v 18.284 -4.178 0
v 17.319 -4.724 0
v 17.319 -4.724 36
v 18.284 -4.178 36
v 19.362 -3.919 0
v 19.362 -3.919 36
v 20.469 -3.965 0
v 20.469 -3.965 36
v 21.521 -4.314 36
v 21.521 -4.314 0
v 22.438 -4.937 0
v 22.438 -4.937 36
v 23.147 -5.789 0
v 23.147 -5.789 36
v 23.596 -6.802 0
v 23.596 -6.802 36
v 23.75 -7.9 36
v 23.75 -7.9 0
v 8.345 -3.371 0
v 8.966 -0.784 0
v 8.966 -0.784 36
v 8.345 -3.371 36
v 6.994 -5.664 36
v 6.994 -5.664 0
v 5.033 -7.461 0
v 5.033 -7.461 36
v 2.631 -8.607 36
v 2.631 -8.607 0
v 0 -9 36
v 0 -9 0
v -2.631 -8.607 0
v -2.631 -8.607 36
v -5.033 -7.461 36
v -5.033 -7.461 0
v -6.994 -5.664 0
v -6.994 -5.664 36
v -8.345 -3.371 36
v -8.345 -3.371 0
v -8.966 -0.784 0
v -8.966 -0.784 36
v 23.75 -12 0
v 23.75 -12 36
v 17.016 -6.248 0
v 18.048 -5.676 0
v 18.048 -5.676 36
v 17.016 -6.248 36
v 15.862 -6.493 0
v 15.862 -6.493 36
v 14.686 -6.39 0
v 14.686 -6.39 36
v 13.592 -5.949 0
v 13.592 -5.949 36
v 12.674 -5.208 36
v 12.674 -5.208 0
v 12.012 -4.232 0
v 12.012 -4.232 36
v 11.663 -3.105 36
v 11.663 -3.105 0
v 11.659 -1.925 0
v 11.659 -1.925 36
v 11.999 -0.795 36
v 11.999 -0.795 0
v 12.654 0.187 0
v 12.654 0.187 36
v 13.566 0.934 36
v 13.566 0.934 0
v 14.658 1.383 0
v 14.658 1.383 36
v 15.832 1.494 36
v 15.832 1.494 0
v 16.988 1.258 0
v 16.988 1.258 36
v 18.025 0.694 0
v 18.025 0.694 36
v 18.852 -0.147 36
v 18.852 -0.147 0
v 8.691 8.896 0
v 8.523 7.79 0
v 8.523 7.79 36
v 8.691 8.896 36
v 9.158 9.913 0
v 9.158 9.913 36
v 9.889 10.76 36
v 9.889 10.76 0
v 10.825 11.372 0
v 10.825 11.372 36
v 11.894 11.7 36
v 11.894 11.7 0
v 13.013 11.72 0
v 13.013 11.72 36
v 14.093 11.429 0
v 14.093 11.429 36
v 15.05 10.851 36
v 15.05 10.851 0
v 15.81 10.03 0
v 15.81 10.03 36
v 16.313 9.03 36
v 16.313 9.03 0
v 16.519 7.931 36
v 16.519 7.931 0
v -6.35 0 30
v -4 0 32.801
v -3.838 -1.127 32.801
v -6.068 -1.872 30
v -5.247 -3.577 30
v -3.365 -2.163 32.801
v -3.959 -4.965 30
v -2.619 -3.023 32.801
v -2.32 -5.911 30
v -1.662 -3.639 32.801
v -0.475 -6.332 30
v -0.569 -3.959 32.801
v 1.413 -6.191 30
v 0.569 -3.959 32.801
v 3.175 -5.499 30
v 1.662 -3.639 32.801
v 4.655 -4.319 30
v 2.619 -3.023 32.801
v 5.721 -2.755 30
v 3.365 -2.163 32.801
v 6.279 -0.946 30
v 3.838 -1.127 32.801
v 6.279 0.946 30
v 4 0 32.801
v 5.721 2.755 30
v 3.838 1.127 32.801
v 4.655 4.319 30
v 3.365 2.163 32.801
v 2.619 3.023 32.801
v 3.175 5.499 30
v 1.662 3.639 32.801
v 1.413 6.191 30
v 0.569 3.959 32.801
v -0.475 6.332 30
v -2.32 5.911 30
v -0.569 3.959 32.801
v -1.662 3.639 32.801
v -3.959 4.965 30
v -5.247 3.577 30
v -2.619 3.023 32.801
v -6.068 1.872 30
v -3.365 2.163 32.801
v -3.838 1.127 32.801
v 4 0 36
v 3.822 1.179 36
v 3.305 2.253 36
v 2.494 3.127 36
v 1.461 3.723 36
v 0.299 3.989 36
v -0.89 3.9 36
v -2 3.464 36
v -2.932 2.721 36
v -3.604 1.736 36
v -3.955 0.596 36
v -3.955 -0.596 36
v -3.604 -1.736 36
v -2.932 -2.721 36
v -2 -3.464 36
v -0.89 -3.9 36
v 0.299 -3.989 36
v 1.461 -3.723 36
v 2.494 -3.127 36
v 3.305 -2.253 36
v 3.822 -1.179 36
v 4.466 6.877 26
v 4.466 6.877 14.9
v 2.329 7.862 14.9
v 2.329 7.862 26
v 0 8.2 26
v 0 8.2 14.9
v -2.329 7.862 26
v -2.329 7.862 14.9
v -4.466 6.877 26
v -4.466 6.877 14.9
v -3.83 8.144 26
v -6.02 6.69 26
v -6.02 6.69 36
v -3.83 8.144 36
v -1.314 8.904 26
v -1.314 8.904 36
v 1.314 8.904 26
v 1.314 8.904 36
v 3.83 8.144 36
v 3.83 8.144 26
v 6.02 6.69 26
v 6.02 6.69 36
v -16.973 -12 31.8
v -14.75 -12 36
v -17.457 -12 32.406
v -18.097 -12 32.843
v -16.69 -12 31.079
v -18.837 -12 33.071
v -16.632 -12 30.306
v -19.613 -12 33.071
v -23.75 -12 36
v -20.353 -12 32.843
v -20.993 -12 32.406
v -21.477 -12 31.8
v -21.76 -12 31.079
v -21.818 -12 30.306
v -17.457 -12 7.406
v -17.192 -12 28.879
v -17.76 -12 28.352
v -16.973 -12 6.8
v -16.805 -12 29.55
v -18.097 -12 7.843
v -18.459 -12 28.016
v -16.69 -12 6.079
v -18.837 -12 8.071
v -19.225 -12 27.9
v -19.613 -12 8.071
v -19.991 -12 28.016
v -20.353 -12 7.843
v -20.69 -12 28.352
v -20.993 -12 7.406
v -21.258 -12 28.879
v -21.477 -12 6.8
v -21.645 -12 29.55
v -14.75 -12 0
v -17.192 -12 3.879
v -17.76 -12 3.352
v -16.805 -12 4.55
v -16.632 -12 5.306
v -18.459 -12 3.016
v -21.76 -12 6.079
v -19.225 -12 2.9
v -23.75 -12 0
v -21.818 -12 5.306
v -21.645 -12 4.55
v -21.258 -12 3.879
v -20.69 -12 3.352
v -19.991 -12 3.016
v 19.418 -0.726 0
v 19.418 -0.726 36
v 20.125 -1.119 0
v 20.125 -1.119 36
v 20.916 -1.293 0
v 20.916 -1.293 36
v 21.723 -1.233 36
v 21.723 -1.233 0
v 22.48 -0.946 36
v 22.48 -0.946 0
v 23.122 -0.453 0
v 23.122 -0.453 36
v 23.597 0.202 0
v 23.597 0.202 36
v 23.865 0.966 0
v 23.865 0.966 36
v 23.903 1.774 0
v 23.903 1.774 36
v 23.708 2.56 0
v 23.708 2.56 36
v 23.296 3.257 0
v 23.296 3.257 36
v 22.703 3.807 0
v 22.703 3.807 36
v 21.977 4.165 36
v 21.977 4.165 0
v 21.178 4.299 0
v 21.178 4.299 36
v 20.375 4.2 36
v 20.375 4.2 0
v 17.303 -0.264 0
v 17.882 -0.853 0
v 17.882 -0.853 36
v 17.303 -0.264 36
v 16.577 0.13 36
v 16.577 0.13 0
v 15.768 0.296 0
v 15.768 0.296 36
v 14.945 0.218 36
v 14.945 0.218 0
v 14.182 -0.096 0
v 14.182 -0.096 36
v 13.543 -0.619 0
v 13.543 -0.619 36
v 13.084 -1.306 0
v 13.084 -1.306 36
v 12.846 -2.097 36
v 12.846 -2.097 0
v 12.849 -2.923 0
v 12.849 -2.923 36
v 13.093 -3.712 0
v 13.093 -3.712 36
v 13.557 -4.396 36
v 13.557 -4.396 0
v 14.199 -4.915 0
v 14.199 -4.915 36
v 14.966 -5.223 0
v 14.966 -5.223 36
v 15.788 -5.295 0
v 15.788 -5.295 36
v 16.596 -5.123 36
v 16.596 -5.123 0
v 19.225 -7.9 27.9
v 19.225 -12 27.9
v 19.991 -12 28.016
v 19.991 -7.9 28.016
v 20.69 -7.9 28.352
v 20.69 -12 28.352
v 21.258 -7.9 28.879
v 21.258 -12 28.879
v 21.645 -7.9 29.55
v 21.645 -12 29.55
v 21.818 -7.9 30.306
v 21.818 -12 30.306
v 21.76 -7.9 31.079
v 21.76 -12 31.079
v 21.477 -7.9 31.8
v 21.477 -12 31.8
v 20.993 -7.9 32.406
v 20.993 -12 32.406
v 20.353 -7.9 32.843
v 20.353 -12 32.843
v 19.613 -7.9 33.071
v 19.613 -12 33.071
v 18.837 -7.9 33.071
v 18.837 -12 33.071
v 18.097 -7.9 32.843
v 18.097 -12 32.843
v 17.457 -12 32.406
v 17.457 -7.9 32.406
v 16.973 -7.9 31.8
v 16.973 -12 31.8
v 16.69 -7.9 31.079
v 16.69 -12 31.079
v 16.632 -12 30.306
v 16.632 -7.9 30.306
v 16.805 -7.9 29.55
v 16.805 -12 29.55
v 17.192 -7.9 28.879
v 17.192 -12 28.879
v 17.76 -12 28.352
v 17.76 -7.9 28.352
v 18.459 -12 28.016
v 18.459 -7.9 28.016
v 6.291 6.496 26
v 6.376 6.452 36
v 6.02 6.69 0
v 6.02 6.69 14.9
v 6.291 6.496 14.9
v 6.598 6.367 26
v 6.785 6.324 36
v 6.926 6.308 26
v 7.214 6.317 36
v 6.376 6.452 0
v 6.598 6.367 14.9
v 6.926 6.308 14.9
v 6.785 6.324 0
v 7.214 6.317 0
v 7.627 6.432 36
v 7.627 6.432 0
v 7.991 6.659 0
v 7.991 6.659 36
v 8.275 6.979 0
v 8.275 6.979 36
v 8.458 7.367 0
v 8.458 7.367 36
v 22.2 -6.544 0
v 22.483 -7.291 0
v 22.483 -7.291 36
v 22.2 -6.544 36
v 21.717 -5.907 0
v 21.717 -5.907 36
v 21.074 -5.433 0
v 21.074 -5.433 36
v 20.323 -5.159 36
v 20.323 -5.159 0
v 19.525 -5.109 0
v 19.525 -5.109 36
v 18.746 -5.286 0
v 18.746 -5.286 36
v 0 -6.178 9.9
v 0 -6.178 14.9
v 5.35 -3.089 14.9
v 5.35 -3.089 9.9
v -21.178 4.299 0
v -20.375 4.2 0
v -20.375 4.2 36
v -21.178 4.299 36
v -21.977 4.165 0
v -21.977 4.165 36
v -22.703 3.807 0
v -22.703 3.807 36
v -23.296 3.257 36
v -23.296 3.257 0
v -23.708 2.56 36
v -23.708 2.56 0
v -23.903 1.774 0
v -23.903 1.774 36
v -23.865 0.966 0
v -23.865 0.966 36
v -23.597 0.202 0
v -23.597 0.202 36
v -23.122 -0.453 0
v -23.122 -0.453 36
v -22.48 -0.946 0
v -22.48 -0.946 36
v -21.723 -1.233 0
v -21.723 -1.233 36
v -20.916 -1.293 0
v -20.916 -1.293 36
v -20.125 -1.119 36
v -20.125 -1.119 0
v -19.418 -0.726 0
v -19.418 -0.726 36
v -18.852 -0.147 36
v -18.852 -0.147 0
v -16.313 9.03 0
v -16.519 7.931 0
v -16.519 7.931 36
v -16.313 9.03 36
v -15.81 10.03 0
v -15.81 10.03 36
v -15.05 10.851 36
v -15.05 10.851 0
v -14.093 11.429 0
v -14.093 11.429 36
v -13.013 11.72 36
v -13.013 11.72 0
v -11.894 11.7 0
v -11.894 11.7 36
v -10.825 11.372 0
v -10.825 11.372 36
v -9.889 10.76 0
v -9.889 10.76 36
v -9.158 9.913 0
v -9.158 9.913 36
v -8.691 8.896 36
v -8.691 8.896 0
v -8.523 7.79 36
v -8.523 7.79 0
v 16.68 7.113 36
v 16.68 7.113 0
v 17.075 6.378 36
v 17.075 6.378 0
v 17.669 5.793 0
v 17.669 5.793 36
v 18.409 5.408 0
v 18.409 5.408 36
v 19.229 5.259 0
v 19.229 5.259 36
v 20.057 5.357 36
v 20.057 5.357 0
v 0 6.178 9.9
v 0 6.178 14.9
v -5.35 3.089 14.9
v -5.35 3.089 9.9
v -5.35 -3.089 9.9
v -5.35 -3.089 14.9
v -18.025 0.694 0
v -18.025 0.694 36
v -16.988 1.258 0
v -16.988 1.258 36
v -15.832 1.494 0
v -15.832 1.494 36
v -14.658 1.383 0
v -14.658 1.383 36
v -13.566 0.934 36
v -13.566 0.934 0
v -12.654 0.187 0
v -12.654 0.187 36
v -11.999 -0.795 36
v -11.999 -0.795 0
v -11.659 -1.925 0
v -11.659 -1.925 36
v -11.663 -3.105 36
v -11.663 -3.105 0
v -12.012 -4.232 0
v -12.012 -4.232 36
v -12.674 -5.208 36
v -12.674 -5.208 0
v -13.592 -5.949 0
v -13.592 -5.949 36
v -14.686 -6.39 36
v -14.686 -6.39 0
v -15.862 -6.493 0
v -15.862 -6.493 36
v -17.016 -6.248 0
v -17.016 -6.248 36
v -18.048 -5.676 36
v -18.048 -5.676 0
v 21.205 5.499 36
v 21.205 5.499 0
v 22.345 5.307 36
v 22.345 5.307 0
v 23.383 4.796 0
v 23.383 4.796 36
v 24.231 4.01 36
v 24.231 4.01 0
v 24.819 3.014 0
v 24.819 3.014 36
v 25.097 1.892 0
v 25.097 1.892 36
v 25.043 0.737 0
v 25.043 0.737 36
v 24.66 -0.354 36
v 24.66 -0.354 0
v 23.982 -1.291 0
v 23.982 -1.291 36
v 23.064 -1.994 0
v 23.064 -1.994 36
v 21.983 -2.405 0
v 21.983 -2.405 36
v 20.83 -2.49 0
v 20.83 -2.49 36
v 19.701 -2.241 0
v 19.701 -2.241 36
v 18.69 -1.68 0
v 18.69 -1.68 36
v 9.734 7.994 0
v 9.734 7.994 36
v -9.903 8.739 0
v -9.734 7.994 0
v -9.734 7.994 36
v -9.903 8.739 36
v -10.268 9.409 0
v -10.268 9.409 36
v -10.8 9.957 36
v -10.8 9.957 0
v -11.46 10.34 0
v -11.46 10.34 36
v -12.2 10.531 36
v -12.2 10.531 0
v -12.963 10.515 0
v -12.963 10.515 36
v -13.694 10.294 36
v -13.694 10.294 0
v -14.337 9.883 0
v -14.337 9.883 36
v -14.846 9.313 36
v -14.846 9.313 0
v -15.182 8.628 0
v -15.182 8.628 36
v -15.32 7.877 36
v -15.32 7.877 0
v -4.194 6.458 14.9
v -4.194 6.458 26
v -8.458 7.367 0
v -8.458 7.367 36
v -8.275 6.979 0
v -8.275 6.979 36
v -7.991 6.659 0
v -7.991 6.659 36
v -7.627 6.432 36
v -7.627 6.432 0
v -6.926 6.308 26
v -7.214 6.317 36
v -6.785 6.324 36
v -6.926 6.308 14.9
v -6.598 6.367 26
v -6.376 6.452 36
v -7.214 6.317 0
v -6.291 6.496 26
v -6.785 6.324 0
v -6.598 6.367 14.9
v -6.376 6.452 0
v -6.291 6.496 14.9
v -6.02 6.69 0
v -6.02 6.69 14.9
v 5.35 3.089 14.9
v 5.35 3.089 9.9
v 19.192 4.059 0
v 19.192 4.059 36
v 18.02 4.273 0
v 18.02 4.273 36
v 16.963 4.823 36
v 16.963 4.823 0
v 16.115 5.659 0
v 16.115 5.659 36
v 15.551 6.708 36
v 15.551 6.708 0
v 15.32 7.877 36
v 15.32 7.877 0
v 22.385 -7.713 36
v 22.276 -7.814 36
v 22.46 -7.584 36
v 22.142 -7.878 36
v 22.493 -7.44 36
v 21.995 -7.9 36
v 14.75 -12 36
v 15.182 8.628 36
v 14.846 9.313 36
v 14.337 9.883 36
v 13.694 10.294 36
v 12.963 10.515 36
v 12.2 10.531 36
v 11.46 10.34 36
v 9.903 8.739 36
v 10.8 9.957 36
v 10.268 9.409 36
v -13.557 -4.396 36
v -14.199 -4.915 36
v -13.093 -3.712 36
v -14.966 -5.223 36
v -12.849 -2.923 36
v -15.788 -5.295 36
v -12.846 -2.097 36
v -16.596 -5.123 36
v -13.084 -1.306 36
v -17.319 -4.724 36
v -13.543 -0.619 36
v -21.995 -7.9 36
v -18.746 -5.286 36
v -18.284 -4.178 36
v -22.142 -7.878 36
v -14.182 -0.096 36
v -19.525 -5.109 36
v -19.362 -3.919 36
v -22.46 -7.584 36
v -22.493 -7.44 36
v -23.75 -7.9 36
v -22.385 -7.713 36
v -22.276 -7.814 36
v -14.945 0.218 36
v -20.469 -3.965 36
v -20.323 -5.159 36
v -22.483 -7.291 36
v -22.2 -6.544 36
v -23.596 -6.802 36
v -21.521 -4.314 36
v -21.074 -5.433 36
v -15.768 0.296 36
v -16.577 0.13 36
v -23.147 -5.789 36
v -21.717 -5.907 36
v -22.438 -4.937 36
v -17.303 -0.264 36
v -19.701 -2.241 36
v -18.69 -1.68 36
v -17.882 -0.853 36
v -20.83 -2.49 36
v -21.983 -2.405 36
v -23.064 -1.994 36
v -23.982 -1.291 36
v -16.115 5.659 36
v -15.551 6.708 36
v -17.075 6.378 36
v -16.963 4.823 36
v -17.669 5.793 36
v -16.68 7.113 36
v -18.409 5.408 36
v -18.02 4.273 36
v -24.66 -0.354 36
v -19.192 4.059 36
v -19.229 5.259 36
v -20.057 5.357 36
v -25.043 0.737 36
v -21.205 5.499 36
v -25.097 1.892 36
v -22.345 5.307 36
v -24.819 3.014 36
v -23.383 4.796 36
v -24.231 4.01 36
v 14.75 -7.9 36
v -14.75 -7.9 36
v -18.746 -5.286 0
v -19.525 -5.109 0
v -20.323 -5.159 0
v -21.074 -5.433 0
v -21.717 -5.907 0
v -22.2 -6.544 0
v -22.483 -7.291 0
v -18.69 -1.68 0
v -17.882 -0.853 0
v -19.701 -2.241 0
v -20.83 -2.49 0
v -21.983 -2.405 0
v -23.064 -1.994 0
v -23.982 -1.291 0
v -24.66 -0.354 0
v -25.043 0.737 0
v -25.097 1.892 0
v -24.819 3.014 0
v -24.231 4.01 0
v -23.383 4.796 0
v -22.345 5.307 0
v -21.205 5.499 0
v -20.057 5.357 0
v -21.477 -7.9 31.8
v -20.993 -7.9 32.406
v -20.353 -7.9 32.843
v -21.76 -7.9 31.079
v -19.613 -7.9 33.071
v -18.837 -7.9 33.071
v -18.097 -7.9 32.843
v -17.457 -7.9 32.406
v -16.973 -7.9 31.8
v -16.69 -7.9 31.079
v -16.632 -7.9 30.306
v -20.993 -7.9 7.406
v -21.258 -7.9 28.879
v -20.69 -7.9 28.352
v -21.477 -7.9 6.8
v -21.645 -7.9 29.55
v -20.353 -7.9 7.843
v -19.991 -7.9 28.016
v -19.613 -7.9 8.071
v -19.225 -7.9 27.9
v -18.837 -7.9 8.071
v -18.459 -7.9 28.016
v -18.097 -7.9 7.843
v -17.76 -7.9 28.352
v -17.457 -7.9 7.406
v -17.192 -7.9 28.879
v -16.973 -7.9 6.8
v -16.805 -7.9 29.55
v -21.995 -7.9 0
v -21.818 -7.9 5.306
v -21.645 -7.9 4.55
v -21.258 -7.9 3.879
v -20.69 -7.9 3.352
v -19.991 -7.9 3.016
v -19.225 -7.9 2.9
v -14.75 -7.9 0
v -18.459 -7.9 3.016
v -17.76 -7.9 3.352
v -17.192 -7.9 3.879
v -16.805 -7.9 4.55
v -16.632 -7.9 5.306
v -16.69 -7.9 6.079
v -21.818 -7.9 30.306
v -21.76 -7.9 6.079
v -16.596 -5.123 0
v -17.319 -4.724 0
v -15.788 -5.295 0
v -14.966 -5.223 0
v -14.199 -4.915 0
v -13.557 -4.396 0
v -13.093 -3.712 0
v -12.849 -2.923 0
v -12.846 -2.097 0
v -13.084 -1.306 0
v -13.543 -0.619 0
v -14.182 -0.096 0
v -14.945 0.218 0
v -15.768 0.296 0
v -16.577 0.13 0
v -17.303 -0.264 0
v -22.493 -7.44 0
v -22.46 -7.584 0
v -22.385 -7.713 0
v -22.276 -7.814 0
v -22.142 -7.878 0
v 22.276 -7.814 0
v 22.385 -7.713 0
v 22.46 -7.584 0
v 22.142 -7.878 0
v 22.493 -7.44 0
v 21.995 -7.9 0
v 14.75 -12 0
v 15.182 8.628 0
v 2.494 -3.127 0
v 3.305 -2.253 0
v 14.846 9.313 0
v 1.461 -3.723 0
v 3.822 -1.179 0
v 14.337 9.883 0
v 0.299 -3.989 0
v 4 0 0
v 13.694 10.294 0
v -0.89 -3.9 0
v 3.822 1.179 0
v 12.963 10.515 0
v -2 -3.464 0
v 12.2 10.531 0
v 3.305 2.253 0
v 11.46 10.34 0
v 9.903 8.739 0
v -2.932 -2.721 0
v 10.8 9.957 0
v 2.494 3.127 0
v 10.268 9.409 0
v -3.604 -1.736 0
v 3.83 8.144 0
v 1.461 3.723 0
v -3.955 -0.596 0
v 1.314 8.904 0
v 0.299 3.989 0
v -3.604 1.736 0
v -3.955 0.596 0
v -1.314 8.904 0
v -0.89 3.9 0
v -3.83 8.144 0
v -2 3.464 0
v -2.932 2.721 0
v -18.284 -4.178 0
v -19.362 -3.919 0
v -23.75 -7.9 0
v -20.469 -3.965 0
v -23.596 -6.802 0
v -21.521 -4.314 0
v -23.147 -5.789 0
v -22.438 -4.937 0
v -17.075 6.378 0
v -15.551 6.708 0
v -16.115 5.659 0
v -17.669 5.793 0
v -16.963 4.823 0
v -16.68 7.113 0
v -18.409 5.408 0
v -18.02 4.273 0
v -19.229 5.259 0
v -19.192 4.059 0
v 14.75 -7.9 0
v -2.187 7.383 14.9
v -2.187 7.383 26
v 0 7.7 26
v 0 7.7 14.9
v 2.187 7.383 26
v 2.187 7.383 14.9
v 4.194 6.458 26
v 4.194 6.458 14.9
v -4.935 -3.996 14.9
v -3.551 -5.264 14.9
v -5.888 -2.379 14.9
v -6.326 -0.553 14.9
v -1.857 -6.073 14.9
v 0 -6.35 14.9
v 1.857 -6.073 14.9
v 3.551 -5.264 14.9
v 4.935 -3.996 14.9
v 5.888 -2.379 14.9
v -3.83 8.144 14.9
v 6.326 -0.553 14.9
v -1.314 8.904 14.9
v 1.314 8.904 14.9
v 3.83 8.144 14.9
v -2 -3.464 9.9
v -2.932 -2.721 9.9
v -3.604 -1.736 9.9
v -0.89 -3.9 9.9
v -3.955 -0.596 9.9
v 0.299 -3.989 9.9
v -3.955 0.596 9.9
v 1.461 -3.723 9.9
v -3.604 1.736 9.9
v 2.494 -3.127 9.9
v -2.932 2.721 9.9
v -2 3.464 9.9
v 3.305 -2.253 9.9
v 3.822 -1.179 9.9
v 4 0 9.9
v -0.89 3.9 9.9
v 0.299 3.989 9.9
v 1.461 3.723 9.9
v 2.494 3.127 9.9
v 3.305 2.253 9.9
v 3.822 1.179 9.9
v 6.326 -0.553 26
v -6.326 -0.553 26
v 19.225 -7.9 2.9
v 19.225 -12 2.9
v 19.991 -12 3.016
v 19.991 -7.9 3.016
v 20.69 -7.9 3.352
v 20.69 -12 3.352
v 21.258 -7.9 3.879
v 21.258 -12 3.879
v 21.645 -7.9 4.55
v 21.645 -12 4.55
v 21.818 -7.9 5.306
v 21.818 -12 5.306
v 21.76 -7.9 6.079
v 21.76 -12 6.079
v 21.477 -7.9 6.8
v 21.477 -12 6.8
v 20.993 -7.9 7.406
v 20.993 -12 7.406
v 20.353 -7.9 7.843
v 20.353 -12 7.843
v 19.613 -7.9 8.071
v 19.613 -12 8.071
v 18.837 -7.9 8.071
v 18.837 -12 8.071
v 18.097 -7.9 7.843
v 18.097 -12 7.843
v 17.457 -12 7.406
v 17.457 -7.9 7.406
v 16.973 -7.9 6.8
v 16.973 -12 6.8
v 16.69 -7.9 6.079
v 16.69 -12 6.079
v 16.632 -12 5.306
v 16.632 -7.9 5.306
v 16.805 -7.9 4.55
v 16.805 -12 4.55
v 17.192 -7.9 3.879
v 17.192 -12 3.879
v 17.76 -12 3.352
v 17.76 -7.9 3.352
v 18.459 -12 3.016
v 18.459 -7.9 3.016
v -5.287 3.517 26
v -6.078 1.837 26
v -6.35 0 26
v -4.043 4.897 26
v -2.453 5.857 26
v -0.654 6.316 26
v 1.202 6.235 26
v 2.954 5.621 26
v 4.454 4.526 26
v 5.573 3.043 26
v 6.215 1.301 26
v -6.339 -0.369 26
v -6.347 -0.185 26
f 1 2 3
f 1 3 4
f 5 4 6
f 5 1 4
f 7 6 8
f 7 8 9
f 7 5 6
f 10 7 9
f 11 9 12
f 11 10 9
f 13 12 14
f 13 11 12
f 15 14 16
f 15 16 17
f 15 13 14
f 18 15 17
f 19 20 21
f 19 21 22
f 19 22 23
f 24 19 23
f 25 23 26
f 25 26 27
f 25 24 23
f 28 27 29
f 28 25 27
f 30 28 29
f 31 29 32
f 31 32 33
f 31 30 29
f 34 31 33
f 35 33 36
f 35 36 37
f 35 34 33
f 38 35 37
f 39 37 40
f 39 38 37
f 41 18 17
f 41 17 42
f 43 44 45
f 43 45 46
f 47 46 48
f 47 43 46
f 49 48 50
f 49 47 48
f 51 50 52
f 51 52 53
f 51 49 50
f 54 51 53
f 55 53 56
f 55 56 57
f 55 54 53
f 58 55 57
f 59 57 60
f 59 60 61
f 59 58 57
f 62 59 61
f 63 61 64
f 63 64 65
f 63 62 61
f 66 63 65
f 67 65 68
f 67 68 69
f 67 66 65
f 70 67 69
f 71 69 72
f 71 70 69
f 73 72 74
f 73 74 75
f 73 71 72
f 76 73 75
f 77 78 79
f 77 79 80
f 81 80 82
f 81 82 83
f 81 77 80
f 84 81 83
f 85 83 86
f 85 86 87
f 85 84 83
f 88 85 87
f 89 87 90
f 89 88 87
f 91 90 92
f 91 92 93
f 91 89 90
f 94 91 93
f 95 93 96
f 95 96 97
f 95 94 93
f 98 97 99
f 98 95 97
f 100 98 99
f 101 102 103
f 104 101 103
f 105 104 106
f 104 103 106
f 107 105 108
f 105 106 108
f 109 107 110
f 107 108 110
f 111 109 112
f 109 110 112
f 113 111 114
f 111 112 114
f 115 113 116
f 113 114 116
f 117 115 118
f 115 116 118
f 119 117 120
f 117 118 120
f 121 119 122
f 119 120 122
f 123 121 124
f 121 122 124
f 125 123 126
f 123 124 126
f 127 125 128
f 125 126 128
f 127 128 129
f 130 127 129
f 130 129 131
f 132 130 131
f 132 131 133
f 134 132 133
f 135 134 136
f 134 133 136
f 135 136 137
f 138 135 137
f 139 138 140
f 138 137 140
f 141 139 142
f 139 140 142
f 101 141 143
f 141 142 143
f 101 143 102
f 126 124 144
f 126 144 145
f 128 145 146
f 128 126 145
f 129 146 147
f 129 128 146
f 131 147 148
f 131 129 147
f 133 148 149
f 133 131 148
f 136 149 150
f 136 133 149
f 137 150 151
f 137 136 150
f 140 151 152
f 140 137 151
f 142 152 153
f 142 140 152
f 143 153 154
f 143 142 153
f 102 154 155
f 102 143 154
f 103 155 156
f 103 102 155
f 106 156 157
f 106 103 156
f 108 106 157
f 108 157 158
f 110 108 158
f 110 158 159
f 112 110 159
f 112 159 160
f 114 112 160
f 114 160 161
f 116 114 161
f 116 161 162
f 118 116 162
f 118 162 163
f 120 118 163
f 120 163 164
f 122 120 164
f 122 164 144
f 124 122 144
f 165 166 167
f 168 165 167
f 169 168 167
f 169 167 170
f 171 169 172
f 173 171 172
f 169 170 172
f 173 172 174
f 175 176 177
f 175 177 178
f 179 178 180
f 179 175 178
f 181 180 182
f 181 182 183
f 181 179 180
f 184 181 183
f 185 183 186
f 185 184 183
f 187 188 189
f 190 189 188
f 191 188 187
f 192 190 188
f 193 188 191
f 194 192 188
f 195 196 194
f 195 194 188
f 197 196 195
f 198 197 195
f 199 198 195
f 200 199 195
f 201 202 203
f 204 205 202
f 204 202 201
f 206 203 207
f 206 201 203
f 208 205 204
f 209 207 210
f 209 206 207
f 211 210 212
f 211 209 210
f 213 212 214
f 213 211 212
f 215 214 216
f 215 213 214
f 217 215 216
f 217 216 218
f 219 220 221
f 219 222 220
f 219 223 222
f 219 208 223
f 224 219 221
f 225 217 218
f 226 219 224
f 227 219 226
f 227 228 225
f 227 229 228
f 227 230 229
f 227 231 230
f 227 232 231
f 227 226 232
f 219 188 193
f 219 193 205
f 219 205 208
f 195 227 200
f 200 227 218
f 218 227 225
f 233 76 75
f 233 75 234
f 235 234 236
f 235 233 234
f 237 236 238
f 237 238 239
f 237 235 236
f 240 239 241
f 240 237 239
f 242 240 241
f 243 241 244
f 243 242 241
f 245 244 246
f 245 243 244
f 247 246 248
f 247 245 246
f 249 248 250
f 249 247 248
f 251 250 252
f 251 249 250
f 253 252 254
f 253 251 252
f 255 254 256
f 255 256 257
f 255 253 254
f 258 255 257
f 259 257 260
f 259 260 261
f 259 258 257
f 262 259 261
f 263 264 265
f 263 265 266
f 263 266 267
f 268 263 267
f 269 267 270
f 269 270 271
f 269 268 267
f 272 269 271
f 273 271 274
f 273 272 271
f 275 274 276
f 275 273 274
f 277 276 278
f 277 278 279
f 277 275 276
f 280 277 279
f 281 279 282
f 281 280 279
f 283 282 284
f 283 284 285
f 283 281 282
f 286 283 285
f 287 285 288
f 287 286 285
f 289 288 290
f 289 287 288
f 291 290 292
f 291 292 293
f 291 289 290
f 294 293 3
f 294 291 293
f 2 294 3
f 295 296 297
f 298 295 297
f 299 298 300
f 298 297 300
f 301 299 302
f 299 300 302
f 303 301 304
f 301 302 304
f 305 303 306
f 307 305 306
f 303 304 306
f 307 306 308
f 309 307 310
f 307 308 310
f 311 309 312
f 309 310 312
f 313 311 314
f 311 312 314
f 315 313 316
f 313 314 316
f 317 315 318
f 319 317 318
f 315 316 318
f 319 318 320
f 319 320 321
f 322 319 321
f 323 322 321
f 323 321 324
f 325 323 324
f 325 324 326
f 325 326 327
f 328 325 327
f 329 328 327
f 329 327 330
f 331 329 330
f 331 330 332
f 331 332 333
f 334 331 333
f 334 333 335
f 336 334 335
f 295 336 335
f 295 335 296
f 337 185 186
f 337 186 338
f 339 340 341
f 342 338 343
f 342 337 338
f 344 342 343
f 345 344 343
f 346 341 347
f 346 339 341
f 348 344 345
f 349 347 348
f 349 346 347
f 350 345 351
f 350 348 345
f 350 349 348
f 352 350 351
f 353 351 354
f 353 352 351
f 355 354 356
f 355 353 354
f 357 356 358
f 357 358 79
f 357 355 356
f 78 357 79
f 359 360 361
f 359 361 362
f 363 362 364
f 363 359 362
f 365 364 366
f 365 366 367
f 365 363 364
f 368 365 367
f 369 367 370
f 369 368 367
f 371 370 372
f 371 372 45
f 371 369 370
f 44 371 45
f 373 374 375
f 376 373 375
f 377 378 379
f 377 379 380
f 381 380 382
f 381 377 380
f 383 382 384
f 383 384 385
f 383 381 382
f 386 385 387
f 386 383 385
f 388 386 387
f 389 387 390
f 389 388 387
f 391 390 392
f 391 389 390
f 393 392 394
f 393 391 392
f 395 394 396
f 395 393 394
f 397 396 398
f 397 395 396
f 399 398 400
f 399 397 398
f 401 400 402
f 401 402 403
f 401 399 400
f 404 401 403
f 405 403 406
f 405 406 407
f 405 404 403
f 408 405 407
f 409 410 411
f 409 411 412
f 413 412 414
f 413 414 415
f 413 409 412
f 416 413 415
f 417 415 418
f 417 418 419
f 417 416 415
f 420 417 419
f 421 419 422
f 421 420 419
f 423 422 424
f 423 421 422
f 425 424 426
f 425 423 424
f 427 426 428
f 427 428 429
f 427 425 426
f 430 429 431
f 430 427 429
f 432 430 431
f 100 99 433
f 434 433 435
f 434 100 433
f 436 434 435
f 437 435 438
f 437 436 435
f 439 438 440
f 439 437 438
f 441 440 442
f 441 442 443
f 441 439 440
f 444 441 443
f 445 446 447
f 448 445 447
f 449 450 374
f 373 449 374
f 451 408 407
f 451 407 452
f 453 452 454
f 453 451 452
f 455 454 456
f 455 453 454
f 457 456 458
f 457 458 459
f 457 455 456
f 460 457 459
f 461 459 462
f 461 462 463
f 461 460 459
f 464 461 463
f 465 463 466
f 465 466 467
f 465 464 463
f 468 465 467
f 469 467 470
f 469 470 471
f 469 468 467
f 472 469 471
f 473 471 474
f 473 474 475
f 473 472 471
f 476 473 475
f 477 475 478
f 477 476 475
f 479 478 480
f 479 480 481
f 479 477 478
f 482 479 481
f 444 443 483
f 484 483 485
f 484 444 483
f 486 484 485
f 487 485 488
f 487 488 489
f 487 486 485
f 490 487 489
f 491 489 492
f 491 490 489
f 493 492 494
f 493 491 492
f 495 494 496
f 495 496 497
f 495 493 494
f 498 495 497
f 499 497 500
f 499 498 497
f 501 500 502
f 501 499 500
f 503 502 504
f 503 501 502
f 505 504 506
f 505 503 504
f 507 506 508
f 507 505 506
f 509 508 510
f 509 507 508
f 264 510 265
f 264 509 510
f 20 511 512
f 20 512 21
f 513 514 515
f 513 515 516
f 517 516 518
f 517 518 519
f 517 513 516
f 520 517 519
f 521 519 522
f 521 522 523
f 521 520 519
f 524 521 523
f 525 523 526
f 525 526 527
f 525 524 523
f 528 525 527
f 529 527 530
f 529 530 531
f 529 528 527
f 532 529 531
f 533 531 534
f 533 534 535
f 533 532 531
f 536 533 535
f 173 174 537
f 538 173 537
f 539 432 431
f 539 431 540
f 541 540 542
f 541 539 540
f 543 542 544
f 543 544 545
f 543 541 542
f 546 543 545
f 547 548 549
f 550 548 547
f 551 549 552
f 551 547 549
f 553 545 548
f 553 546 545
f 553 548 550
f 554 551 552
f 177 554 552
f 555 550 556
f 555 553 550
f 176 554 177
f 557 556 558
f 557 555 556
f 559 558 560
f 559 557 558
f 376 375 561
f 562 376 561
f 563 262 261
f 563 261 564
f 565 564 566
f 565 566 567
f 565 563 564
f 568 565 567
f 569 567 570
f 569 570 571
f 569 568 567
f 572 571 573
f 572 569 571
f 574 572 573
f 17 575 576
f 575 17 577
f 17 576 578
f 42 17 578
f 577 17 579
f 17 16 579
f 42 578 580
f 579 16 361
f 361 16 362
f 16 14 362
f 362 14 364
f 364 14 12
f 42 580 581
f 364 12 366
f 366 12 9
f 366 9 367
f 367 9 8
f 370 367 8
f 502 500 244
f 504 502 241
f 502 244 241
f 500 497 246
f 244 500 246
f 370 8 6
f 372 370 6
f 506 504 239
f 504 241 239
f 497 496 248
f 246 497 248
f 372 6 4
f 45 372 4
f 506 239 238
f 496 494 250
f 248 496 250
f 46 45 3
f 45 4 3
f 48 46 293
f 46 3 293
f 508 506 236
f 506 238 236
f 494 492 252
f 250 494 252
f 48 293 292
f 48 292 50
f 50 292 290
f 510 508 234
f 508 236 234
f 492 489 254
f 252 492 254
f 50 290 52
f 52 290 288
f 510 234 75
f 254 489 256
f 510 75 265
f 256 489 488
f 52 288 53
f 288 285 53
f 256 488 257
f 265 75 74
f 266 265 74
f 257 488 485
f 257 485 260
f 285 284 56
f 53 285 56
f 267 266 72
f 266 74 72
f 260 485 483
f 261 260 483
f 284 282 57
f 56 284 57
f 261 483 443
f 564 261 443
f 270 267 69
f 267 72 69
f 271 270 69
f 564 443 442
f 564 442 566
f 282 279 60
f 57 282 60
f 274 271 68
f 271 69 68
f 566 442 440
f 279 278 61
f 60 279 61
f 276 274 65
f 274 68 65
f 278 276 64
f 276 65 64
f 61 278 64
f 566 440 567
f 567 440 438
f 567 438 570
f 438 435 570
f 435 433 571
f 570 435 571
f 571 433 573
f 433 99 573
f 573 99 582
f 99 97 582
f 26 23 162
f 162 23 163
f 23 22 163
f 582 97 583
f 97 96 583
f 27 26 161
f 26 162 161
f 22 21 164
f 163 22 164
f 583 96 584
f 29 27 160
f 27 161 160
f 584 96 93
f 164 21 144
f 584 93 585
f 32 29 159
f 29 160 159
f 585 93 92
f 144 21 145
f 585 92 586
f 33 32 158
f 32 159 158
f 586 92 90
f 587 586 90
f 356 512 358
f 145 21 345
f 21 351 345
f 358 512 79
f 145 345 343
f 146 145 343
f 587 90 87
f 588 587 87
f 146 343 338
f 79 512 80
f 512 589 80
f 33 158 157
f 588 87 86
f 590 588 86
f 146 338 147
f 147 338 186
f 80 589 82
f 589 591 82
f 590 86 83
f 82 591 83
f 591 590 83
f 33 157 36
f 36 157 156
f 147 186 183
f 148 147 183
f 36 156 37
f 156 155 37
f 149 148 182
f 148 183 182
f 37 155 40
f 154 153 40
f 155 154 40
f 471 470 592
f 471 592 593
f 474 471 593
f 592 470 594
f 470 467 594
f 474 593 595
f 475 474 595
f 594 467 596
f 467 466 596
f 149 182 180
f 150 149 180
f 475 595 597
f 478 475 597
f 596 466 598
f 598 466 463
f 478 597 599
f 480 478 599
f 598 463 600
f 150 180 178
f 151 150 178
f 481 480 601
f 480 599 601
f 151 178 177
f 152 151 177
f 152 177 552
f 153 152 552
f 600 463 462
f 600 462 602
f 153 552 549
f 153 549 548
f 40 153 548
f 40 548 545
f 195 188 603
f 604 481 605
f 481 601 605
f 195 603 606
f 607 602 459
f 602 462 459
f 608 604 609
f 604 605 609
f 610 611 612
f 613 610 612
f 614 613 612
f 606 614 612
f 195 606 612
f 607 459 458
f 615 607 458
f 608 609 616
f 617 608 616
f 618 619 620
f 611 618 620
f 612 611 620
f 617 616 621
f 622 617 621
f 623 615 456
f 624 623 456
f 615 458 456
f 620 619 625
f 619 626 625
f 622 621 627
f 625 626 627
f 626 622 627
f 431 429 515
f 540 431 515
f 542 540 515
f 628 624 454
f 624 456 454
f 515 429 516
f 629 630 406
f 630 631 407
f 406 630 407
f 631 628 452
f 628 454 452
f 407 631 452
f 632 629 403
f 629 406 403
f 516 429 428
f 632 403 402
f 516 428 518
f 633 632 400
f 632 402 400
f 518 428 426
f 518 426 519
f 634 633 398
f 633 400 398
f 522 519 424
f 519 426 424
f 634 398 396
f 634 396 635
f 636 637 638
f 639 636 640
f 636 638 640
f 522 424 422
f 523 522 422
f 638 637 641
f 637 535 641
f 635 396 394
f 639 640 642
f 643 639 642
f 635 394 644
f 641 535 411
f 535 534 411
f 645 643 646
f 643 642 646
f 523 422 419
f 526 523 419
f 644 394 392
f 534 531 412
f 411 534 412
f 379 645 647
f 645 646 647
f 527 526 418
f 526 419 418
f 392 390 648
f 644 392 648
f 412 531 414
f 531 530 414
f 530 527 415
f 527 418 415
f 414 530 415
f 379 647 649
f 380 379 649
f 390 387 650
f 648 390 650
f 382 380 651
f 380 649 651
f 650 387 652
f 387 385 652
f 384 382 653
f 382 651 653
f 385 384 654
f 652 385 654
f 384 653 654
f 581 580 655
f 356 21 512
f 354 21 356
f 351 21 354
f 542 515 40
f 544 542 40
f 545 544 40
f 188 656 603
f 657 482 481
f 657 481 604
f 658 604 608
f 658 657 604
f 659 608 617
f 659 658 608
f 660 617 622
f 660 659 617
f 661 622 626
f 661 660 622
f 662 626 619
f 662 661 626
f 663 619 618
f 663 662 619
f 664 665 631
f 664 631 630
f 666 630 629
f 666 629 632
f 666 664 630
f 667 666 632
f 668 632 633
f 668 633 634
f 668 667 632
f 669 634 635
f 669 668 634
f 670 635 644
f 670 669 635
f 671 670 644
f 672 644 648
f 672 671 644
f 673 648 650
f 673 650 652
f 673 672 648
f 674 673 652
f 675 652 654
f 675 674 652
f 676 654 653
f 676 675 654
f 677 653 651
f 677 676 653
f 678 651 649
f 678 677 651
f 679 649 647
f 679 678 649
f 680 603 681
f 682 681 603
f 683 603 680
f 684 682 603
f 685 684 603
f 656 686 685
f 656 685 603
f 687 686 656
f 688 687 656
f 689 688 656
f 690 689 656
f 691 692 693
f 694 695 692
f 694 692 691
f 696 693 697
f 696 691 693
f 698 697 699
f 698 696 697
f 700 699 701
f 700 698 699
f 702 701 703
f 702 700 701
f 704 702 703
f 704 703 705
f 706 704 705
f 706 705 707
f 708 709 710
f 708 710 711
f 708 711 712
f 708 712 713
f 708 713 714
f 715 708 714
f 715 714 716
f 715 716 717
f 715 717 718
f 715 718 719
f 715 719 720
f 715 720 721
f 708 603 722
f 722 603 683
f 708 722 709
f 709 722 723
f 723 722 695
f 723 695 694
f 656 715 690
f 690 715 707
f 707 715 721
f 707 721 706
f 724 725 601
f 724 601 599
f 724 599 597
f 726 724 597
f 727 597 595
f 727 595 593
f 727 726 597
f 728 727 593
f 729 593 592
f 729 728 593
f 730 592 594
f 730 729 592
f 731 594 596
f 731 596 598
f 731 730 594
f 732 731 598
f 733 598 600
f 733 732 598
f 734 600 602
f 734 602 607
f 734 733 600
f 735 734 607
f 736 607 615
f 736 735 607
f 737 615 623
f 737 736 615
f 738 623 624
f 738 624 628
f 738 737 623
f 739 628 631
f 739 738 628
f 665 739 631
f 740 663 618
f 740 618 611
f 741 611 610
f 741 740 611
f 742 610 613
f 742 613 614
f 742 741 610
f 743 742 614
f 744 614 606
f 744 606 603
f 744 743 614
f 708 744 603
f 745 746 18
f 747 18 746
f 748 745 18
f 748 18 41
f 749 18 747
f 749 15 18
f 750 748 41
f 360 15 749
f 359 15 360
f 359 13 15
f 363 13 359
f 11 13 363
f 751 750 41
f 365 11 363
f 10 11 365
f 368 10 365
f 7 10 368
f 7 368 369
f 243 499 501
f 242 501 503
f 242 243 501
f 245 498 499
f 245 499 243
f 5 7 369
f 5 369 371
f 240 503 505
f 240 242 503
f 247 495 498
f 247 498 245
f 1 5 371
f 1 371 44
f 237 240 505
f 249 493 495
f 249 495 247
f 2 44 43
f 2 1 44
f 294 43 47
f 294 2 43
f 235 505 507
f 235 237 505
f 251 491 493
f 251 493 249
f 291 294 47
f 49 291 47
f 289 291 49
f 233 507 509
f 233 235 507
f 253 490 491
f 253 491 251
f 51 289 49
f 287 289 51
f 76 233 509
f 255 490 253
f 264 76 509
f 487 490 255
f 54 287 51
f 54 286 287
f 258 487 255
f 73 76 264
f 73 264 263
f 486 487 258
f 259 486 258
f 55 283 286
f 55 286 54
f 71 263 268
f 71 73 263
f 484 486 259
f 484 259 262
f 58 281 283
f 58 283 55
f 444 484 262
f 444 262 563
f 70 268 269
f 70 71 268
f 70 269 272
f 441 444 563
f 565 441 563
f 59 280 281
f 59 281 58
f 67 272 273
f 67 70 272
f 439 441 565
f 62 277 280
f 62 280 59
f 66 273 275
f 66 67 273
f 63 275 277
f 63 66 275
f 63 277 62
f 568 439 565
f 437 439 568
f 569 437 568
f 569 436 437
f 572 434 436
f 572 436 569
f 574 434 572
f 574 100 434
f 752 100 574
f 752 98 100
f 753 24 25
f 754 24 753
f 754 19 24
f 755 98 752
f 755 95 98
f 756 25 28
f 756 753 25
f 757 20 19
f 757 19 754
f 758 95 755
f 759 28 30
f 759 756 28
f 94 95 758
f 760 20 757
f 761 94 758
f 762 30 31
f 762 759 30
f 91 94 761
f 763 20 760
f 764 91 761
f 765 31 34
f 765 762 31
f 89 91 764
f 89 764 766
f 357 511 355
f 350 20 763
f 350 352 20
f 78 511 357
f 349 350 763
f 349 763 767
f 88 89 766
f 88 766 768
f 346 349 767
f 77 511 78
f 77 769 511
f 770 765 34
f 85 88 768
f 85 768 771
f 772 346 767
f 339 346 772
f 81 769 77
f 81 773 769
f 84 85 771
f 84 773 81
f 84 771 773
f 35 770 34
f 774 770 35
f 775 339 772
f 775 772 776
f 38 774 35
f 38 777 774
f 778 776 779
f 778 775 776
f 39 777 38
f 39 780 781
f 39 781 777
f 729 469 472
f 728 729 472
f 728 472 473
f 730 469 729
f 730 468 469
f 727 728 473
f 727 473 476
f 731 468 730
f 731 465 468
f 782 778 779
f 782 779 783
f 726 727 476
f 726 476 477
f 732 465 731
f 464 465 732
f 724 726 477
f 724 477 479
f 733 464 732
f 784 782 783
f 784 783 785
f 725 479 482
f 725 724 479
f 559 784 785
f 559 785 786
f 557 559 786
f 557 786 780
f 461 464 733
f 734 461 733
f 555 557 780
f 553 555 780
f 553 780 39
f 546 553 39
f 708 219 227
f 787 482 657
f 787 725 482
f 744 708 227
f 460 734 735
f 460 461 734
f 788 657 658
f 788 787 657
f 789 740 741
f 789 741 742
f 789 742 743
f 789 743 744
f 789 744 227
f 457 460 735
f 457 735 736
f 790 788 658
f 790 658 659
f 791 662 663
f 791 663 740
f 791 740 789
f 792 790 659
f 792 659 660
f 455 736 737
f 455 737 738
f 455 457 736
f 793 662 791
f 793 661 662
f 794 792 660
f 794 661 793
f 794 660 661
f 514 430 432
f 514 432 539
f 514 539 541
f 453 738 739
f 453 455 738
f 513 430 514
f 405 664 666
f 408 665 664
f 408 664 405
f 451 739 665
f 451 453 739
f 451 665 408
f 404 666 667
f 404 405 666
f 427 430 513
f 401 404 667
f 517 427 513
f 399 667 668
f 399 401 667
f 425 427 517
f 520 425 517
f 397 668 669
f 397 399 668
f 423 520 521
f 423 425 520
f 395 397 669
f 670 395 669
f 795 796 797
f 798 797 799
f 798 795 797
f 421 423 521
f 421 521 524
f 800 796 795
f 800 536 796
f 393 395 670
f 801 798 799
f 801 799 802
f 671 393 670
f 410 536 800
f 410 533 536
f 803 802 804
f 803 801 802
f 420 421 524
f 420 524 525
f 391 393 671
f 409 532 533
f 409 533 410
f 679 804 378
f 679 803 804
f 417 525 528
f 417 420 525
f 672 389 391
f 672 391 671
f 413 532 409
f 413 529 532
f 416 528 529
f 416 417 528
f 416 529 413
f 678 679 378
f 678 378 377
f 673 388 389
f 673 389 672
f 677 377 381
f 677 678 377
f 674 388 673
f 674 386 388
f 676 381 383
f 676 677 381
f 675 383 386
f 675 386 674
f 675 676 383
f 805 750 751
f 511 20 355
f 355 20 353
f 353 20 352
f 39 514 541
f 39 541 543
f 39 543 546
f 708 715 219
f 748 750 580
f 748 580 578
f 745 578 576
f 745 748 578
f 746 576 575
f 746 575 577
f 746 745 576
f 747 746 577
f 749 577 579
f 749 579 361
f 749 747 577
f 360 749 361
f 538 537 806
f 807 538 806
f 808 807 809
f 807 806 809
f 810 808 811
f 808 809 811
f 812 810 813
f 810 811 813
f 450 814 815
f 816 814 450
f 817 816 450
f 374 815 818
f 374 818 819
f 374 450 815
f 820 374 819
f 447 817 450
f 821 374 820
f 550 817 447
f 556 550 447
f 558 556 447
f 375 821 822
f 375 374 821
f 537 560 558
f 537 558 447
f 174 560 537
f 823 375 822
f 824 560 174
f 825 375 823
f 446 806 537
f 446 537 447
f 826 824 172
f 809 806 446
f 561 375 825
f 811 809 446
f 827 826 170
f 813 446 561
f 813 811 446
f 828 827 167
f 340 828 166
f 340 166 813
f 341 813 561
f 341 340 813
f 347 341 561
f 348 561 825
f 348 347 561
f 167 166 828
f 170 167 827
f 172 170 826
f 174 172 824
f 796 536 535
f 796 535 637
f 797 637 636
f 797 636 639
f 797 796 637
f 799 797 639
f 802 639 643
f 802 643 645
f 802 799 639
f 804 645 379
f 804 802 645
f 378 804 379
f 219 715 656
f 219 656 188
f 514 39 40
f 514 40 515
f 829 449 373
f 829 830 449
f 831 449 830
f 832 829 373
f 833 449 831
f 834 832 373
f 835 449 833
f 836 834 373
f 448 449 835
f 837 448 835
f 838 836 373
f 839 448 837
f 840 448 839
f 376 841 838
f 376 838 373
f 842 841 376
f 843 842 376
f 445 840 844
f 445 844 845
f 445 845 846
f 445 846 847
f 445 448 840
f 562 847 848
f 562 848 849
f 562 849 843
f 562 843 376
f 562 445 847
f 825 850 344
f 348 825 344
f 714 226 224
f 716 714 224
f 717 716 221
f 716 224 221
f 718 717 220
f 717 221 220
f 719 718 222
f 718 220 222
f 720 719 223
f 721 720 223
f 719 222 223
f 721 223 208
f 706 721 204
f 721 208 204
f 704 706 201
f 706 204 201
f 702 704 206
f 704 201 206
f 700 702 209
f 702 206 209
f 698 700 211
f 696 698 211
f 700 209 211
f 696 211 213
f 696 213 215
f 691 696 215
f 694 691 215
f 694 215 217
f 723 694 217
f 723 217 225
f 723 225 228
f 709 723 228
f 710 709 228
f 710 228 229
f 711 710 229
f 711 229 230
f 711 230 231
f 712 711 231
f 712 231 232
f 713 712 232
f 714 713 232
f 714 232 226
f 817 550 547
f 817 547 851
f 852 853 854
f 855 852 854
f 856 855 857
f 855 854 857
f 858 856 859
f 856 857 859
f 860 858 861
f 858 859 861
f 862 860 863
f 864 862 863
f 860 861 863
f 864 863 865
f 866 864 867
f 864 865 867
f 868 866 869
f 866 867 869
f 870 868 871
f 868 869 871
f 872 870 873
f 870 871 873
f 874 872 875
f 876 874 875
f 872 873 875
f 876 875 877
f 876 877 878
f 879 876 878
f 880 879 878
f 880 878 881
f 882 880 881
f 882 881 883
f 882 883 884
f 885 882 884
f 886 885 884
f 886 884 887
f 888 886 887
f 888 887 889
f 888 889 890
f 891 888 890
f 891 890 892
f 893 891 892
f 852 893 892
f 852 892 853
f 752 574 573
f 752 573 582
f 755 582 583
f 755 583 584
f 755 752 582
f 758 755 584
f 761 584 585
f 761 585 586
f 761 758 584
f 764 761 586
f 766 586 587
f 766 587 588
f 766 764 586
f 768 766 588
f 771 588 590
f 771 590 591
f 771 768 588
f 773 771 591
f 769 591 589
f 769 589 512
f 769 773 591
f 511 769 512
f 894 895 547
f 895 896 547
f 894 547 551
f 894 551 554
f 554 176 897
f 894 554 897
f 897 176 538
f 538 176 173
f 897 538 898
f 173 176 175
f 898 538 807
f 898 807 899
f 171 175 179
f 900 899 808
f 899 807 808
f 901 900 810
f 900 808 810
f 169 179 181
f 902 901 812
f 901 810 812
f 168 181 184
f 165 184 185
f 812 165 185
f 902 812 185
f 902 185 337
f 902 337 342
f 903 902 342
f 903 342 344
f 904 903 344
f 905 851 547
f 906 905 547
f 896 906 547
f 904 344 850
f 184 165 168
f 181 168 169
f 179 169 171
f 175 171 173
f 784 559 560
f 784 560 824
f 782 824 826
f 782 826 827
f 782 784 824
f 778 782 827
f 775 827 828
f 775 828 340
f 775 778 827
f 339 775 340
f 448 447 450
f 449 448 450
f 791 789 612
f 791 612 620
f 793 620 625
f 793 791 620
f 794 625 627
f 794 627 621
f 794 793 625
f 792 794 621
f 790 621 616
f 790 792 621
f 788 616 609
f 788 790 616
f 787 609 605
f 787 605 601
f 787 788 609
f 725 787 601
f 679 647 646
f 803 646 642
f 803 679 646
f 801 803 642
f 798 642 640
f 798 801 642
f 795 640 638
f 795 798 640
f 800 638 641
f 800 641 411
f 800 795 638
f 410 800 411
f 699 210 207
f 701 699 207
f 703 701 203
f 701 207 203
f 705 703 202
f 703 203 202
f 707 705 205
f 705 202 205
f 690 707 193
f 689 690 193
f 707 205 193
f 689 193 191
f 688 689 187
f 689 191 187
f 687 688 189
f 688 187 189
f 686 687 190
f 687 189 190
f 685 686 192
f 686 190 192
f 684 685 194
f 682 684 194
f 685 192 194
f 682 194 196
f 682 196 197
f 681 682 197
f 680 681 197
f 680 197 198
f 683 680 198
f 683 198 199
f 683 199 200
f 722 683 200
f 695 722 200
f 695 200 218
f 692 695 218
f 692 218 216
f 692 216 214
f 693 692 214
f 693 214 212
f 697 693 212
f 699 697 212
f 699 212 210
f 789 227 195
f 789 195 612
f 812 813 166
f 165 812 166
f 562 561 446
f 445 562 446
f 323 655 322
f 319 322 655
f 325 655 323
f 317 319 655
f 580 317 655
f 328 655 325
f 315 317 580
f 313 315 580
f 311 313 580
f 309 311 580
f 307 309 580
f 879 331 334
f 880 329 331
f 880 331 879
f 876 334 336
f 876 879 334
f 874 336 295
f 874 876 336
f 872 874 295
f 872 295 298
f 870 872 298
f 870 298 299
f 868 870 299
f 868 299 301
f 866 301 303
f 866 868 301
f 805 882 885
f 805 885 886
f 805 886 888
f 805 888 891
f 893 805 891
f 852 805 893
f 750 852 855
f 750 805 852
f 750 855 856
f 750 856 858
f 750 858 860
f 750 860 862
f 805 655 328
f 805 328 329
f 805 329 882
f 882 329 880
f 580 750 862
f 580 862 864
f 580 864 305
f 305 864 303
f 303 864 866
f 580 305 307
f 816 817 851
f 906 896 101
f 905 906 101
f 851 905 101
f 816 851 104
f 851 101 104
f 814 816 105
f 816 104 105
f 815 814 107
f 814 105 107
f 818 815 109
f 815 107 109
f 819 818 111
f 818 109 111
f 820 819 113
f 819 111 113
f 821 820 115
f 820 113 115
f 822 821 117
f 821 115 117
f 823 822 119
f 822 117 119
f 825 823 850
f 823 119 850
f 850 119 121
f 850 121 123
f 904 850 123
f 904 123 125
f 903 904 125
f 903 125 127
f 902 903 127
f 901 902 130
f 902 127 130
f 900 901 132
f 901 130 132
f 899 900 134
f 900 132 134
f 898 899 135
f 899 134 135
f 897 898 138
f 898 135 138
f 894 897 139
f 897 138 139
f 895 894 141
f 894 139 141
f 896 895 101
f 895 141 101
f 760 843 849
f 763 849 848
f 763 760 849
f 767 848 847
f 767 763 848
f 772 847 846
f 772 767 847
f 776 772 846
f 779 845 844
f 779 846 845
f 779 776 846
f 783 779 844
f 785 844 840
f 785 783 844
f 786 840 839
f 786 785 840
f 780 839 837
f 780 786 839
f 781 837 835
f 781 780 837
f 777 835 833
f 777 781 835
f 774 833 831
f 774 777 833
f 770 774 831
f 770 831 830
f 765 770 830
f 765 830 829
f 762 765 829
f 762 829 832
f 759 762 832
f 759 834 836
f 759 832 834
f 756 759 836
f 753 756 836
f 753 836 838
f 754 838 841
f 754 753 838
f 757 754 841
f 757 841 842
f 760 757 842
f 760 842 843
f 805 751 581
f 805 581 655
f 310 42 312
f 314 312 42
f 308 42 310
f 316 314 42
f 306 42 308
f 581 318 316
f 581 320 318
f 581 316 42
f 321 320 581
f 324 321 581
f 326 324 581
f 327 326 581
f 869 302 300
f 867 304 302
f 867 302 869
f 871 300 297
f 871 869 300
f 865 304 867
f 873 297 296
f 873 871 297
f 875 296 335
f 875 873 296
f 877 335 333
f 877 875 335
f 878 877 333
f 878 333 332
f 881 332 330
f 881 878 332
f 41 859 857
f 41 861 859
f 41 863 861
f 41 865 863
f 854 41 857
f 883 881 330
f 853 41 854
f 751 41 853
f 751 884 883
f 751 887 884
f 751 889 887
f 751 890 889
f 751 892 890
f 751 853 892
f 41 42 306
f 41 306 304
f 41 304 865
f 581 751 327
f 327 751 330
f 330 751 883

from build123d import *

# Parameters (mm, degrees)
SKETCH1_R           = 4
BOSS_EXTRUDE1_DEPTH = 36
SKETCH2_R           = 2.6
CUT_EXTRUDE1_DEPTH  = 4.2
CUT_EXTRUDE2_START  = -10
CUT_EXTRUDE2_DEPTH  = 11.1
CUT_EXTRUDE3_DEPTH  = 5
BOSS_EXTRUDE2_DEPTH = 11.1


with BuildPart() as part:
    # Sketch1 → Boss-Extrude1 (new body)
    with BuildSketch(Plane.XY):
        with BuildLine():
            Line((-14.75, -7.9), (-14.75, -12))
            Line((-14.75, -12), (-23.75, -12))
            Line((-23.75, -12), (-23.75, -7.9))
            ThreePointArc((-23.75, -7.9), (-21.521408325, -4.313621249), (-17.318943727, -4.723529412))
            ThreePointArc((-17.318943727, -4.723529412), (-12.846321275, -2.097250623), (-17.881535856, -0.852941176))
            ThreePointArc((-17.881535856, -0.852941176), (-24.891297515, 0.177367286), (-20.057391817, 5.357294867))
            ThreePointArc((-20.057391817, 5.357294867), (-17.669207765, 5.792991841), (-16.519021958, 7.930824279))
            ThreePointArc((-16.519021958, 7.930824279), (-12.452765055, 11.749381379), (-8.523313091, 7.790185654))
            ThreePointArc((-8.523313091, 7.790185654), (-7.626821013, 6.431985616), (-6.020047535, 6.690218806))
            ThreePointArc((-6.020047535, 6.690218806), (0, 9), (6.020047535, 6.690218806))
            ThreePointArc((6.020047535, 6.690218806), (7.626821013, 6.431985616), (8.523313091, 7.790185654))
            ThreePointArc((8.523313091, 7.790185654), (12.452765055, 11.749381379), (16.519021958, 7.930824279))
            ThreePointArc((16.519021958, 7.930824279), (17.669207765, 5.792991841), (20.057391817, 5.357294867))
            ThreePointArc((20.057391817, 5.357294867), (24.891297515, 0.177367286), (17.881535856, -0.852941176))
            ThreePointArc((17.881535856, -0.852941176), (12.846321275, -2.097250623), (17.318943727, -4.723529412))
            ThreePointArc((17.318943727, -4.723529412), (21.521408325, -4.313621249), (23.75, -7.9))
            Line((23.75, -7.9), (23.75, -12))
            Line((23.75, -12), (14.75, -12))
            Line((14.75, -12), (14.75, -7.9))
            Line((14.75, -7.9), (21.994994432, -7.9))
            ThreePointArc((21.994994432, -7.9), (22.385089181, -7.712771621), (22.4830367, -7.291304348))
            ThreePointArc((22.4830367, -7.291304348), (20.708026906, -5.268995544), (18.048260609, -5.676470588))
            ThreePointArc((18.048260609, -5.676470588), (11.658799963, -1.924643747), (18.85196365, -0.147058824))
            ThreePointArc((18.85196365, -0.147058824), (23.758796811, 0.5741571), (20.375062823, 4.200106407))
            ThreePointArc((20.375062823, 4.200106407), (16.963371319, 4.822530655), (15.320248738, 7.876576995))
            ThreePointArc((15.320248738, 7.876576995), (12.581969864, 10.5493813), (9.733766071, 7.99403608))
            Line((9.733766071, 7.99403608), (8.965752283, -0.784401685))
            ThreePointArc((8.965752283, -0.784401685), (0, -9), (-8.965752283, -0.784401685))
            Line((-8.965752283, -0.784401685), (-9.733766071, 7.99403608))
            ThreePointArc((-9.733766071, 7.99403608), (-12.581969864, 10.5493813), (-15.320248738, 7.876576995))
            ThreePointArc((-15.320248738, 7.876576995), (-16.963371319, 4.822530655), (-20.375062823, 4.200106407))
            ThreePointArc((-20.375062823, 4.200106407), (-23.758796811, 0.5741571), (-18.85196365, -0.147058824))
            ThreePointArc((-18.85196365, -0.147058824), (-11.658799963, -1.924643747), (-18.048260609, -5.676470588))
            ThreePointArc((-18.048260609, -5.676470588), (-20.708026906, -5.268995544), (-22.4830367, -7.291304348))
            ThreePointArc((-22.4830367, -7.291304348), (-22.385089181, -7.712771621), (-21.994994432, -7.9))
            Line((-21.994994432, -7.9), (-14.75, -7.9))
        make_face()
        Circle(SKETCH1_R, mode=Mode.SUBTRACT)
    extrude(amount=BOSS_EXTRUDE1_DEPTH)

    # Sketch2 → Cut-Extrude1 (cut)
    with BuildSketch(Plane.XZ.offset(12)):
        with Locations(Location((-19.225, 30.5, 0), (0, 0, 270))):  # turned: the seam where the file's is
            Circle(SKETCH2_R)
        with Locations(Location((-19.225, 5.5, 0), (0, 0, 270))):  # turned: the seam where the file's is
            Circle(SKETCH2_R)
        with Locations(Location((19.225, 5.5, 0), (0, 0, 270))):  # turned: the seam where the file's is
            Circle(SKETCH2_R)
        with Locations(Location((19.225, 30.5, 0), (0, 0, 270))):  # turned: the seam where the file's is
            Circle(SKETCH2_R)
    extrude(amount=-CUT_EXTRUDE1_DEPTH, mode=Mode.SUBTRACT)

    # Sketch3 → Cut-Extrude2 (cut)
    with BuildSketch(Plane.XY.offset(36).offset(CUT_EXTRUDE2_START)):
        with BuildLine():
            Line((-7.008961202, 7.254714015), (-6.325836333, -0.553438966))
            ThreePointArc((-6.325836333, -0.553438966), (0, -6.35), (6.325836333, -0.553438966))
            Line((6.325836333, -0.553438966), (7.008961202, 7.254714015))
            ThreePointArc((7.008961202, 7.254714015), (0, 10.087438355), (-7.008961202, 7.254714015))
        make_face()
    extrude(amount=-CUT_EXTRUDE2_DEPTH, mode=Mode.SUBTRACT)

    # Sketch4 → Cut-Revolve1 (revolve, cut)
    with BuildSketch(Plane(origin=(0, 0, 0), x_dir=(1, 0, 0), z_dir=(0, 1, 0))):
        Polygon((0, -14.9), (-6.35, -14.9), (-6.35, -30), (-1.273774508, -36.049609967), (0, -36.049609967), align=None)
    revolve(axis=Axis((0, 0, 14.9), (0, 0, 1)), mode=Mode.SUBTRACT)

    # Sketch5 → Cut-Extrude3 (cut)
    with BuildSketch(Plane.XY.offset(14.9)):
        Polygon((5.35, -3.08882394), (5.35, 3.08882394), (0, 6.17764788), (-5.35, 3.08882394), (-5.35, -3.08882394), (0, -6.17764788), align=None)
    extrude(amount=-CUT_EXTRUDE3_DEPTH, mode=Mode.SUBTRACT)

    # Sketch6 → Boss-Extrude2 (add)
    with BuildSketch(Plane.XY.offset(14.9)):
        with BuildLine():
            Line((-4.466040087, 6.877098657), (-4.19372057, 6.457763373))
            ThreePointArc((-4.19372057, 6.457763373), (0, 7.7), (4.19372057, 6.457763373))
            Line((4.19372057, 6.457763373), (4.466040087, 6.877098657))
            ThreePointArc((4.466040087, 6.877098657), (0, 8.2), (-4.466040087, 6.877098657))
        make_face()
    extrude(amount=BOSS_EXTRUDE2_DEPTH)


solid = part.part
